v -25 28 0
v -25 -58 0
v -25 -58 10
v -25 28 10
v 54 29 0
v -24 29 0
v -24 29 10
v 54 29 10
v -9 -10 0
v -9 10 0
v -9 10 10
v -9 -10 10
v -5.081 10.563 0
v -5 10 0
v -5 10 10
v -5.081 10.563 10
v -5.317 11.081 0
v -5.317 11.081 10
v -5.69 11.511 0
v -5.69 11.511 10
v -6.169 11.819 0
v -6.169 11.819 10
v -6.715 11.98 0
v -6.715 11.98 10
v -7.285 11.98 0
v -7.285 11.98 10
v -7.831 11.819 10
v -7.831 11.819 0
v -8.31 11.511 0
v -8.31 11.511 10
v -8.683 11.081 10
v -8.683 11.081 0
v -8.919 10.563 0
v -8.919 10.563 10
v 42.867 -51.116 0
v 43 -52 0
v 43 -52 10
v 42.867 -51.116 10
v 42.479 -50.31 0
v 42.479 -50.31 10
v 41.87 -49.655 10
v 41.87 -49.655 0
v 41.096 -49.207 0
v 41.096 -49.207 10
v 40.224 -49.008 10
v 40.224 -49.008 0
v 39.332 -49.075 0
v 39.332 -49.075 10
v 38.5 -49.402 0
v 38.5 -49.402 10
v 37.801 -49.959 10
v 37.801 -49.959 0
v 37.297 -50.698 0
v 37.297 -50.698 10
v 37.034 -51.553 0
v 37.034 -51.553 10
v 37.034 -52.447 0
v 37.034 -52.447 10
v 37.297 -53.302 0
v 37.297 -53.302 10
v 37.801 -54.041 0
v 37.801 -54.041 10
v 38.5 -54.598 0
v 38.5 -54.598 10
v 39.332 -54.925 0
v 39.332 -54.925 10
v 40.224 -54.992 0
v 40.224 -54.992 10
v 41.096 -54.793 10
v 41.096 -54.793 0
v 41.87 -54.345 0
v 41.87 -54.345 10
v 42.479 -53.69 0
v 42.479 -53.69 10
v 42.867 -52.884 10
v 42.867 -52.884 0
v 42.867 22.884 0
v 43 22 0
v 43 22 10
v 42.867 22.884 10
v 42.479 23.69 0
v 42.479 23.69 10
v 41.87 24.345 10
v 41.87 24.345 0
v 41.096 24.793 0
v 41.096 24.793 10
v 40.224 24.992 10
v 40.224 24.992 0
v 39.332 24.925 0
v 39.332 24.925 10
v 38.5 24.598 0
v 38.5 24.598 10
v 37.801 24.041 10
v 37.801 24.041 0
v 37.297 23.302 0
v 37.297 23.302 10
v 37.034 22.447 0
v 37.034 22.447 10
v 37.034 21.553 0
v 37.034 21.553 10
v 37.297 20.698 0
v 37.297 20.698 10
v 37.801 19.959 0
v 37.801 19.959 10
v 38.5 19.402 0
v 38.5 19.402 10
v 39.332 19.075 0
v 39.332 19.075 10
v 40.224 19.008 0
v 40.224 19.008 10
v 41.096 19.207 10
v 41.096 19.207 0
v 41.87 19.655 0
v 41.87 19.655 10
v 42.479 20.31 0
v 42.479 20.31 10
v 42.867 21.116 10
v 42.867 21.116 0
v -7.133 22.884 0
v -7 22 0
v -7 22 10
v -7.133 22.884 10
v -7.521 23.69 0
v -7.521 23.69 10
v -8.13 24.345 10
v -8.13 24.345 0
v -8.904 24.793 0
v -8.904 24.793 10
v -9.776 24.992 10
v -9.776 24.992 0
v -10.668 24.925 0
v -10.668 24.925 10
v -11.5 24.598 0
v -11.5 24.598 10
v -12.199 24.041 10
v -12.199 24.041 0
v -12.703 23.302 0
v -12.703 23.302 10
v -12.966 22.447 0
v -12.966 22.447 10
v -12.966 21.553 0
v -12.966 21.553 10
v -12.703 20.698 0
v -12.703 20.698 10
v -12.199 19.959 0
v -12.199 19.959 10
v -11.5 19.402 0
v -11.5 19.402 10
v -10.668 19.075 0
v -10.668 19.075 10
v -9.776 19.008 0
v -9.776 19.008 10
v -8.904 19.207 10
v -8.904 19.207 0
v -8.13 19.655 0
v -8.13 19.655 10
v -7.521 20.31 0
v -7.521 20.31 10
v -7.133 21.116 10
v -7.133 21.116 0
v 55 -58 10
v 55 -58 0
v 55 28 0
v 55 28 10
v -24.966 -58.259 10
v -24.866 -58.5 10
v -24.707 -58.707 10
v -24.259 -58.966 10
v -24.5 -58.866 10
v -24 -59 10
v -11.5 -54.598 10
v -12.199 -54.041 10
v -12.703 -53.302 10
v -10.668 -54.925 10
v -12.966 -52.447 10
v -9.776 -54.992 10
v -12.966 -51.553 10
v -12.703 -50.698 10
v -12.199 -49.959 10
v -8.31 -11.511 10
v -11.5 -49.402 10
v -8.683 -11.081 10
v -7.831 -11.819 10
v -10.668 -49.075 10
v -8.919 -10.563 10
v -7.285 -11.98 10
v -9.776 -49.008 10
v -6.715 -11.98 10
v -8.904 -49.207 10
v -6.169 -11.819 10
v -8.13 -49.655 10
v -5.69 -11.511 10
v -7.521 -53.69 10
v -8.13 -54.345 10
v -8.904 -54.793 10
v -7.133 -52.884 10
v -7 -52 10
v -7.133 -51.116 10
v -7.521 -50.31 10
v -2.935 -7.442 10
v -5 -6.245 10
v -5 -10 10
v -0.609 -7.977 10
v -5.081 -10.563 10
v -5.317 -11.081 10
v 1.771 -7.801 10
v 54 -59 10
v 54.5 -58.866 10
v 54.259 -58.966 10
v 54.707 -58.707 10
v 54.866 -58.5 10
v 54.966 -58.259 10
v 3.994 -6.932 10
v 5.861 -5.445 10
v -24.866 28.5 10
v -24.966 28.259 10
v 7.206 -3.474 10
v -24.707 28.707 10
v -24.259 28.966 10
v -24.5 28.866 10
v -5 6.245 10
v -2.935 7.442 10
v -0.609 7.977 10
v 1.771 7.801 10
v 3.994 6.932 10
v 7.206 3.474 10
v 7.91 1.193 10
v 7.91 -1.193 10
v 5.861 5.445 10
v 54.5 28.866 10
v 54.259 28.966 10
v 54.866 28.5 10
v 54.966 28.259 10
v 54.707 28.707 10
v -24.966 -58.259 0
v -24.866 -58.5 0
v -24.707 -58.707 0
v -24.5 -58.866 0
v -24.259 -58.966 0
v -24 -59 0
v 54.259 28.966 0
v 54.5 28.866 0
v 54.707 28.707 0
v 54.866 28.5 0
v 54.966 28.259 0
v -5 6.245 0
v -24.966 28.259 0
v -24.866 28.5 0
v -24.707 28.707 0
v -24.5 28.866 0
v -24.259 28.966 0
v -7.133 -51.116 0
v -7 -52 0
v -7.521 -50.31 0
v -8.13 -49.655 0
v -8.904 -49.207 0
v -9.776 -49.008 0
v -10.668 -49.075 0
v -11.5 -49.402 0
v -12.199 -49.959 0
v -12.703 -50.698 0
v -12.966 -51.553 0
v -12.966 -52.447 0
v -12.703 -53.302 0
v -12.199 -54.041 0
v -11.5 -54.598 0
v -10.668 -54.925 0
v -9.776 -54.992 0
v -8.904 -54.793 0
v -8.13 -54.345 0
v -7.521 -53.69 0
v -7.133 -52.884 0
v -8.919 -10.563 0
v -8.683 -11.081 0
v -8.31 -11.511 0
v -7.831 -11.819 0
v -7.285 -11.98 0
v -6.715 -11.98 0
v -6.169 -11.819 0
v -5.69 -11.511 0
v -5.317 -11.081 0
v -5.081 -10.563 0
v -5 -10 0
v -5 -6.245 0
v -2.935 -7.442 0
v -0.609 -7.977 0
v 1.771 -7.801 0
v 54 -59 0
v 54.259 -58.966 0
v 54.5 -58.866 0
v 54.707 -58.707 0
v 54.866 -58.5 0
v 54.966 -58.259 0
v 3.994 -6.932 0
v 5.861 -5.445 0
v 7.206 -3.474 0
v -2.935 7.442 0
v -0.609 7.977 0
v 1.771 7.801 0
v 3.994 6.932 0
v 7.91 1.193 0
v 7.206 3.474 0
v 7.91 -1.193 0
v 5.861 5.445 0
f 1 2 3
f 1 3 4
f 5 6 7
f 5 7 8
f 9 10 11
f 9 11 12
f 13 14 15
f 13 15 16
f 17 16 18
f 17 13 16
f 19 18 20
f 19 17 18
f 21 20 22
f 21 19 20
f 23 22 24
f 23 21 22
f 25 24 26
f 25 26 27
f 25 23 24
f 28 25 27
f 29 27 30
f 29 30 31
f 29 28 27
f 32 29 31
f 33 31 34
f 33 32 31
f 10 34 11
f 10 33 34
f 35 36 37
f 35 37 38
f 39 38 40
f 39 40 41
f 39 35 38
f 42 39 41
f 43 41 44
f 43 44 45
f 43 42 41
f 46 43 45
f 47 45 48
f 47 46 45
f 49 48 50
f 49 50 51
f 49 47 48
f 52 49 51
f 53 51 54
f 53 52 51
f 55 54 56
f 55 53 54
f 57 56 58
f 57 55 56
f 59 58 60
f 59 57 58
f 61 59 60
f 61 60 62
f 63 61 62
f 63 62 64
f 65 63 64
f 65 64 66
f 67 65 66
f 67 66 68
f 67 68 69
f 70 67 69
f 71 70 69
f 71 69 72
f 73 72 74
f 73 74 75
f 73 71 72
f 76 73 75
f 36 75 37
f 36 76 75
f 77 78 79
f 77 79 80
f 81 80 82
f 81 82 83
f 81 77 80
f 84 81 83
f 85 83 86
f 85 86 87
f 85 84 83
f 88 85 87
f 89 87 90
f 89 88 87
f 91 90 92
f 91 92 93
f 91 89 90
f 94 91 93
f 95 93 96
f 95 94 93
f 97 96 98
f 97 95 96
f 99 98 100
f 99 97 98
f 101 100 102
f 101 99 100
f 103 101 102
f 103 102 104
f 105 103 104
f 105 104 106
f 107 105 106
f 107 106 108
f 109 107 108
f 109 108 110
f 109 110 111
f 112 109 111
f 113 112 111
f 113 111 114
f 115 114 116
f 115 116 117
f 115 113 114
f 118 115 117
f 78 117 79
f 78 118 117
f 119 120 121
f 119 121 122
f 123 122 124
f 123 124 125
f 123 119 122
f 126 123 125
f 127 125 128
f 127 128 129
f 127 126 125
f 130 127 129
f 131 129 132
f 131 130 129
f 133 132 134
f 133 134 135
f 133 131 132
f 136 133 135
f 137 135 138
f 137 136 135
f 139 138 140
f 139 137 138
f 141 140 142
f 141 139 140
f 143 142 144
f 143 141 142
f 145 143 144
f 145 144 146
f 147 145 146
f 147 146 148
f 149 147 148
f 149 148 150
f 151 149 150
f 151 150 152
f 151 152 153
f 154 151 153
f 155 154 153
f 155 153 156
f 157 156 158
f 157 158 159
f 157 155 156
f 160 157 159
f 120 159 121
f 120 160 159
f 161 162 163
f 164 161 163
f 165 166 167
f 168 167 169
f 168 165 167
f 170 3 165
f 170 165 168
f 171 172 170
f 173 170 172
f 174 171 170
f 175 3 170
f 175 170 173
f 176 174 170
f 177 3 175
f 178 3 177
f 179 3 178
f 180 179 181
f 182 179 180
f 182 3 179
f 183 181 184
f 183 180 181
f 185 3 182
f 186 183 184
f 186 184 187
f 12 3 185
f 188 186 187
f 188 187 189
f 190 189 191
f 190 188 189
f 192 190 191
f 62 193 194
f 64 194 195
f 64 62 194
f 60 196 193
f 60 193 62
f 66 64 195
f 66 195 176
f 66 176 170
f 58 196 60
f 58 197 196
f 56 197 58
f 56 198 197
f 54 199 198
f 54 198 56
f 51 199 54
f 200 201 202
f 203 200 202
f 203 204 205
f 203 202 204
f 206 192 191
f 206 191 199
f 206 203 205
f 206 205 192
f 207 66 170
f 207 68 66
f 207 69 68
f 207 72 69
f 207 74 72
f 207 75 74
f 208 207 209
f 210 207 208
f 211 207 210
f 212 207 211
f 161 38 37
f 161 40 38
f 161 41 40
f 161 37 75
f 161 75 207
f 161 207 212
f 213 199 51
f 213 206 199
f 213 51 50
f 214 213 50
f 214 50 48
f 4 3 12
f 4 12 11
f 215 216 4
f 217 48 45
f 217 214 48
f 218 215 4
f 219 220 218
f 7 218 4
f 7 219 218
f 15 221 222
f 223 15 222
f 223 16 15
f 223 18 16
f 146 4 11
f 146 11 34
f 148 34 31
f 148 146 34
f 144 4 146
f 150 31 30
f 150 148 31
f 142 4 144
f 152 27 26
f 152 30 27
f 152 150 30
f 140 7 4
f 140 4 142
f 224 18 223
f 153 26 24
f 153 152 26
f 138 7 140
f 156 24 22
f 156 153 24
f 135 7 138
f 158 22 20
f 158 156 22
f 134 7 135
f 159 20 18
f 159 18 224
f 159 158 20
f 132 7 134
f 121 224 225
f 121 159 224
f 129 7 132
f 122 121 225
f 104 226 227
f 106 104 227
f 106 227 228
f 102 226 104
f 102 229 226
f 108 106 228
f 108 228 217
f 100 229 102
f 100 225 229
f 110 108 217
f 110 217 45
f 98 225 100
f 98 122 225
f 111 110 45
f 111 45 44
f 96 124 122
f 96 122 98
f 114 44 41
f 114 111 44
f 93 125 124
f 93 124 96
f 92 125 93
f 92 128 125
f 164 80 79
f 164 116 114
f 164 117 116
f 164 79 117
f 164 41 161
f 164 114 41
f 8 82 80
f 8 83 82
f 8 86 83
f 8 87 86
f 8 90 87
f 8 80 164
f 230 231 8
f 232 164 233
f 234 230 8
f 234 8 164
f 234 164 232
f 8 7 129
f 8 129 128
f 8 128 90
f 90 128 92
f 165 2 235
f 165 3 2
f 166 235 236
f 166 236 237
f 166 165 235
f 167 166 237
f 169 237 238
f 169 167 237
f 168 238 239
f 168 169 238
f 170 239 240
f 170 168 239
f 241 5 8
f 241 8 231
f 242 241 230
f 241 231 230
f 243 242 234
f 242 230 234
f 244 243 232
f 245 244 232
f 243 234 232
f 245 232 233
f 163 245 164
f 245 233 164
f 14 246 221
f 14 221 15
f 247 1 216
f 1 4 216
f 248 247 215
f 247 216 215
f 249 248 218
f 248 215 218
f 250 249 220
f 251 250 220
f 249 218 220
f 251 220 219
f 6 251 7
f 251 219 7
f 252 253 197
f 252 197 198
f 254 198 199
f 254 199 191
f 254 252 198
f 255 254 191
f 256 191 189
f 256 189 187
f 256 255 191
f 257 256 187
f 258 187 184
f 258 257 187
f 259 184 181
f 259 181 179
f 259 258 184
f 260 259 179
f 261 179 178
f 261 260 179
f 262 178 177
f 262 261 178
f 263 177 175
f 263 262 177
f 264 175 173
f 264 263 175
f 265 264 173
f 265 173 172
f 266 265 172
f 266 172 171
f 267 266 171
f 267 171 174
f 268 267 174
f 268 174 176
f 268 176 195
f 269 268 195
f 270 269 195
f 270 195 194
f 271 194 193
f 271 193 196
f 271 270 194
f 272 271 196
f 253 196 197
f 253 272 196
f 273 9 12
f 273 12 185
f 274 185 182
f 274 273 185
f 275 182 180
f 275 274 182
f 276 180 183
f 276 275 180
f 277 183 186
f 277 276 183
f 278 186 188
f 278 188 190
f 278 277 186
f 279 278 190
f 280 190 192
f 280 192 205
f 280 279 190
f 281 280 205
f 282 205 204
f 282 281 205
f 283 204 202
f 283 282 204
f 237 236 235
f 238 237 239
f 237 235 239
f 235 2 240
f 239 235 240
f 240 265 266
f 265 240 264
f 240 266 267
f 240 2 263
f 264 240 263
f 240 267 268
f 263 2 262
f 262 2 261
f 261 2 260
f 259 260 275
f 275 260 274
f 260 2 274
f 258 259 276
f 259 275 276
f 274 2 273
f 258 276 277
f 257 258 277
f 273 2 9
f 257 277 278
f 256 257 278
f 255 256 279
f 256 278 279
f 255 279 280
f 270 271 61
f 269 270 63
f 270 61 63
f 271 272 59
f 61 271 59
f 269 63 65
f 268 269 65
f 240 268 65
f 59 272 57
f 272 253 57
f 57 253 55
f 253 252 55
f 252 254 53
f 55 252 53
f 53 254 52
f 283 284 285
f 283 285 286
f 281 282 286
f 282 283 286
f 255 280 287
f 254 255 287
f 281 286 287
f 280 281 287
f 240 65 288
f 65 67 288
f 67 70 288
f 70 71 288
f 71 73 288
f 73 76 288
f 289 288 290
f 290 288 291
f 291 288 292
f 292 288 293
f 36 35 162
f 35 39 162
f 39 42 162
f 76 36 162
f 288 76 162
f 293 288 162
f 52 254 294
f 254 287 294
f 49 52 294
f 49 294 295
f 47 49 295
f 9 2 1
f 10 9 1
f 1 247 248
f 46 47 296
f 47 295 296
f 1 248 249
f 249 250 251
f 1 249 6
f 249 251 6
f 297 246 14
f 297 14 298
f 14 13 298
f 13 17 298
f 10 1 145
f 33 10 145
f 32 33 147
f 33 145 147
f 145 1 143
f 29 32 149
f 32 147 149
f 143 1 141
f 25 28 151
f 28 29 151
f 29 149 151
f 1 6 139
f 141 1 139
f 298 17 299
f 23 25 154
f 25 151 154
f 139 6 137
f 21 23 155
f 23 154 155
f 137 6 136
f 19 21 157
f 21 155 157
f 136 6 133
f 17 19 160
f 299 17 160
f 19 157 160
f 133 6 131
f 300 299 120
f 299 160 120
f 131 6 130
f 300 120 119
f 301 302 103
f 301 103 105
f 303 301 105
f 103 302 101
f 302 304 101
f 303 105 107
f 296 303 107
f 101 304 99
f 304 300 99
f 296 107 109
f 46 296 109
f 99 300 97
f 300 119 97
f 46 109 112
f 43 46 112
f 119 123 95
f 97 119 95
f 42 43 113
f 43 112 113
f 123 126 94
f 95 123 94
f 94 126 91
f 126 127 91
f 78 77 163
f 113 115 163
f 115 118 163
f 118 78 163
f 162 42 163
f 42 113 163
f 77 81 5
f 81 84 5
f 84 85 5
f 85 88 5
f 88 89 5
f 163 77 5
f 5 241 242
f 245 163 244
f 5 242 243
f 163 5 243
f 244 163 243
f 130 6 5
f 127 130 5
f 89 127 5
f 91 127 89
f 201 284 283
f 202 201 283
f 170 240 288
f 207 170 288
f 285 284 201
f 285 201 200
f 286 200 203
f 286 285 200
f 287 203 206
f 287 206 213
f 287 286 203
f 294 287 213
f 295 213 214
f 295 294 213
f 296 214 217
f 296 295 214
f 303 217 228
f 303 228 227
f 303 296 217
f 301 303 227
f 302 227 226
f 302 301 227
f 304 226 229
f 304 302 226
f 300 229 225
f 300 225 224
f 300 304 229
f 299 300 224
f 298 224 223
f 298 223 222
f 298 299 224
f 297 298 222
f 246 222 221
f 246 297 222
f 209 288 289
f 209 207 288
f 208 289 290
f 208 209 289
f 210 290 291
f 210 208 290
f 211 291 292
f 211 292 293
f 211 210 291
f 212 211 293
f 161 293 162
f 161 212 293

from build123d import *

# Parameters (mm, degrees)
SKETCH_W    = 80
SKETCH_H    = 88
SKETCH_R    = 3
PAD_DEPTH   = 10
FILLET_R    = 1
FILLET001_R = 1


with BuildPart() as part:
    # Sketch → Pad (new body)
    with BuildSketch(Plane.XY):
        with Locations((15, -15)):
            Rectangle(SKETCH_W, SKETCH_H)
        with Locations((-10, -52)):
            Circle(SKETCH_R, mode=Mode.SUBTRACT)
        with Locations((40, -52)):
            Circle(SKETCH_R, mode=Mode.SUBTRACT)
        with Locations((40, 22)):
            Circle(SKETCH_R, mode=Mode.SUBTRACT)
        with Locations((-10, 22)):
            Circle(SKETCH_R, mode=Mode.SUBTRACT)
        with BuildLine():
            ThreePointArc((-5, -6.244998), (8, 0), (-5, 6.244998))
            Line((-5, 6.244998), (-5, 10))
            ThreePointArc((-5, 10), (-7, 12), (-9, 10))
            Line((-9, 10), (-9, -10))
            ThreePointArc((-9, -10), (-7, -12), (-5, -10))
            Line((-5, -6.244998), (-5, -10))
        make_face(mode=Mode.SUBTRACT)
    extrude(amount=PAD_DEPTH)

    # Fillet
    fillet_edges = [part.edges().sort_by_distance(p)[0] for p in [
        (-25, -59, 5),
        (-25, 29, 5),
    ]]
    fillet(fillet_edges, radius=FILLET_R)

    # Fillet001
    fillet001_edges = [part.edges().sort_by_distance(p)[0] for p in [
        (55, -59, 5),
        (55, 29, 5),
    ]]
    fillet(fillet001_edges, radius=FILLET001_R)


solid = part.part
